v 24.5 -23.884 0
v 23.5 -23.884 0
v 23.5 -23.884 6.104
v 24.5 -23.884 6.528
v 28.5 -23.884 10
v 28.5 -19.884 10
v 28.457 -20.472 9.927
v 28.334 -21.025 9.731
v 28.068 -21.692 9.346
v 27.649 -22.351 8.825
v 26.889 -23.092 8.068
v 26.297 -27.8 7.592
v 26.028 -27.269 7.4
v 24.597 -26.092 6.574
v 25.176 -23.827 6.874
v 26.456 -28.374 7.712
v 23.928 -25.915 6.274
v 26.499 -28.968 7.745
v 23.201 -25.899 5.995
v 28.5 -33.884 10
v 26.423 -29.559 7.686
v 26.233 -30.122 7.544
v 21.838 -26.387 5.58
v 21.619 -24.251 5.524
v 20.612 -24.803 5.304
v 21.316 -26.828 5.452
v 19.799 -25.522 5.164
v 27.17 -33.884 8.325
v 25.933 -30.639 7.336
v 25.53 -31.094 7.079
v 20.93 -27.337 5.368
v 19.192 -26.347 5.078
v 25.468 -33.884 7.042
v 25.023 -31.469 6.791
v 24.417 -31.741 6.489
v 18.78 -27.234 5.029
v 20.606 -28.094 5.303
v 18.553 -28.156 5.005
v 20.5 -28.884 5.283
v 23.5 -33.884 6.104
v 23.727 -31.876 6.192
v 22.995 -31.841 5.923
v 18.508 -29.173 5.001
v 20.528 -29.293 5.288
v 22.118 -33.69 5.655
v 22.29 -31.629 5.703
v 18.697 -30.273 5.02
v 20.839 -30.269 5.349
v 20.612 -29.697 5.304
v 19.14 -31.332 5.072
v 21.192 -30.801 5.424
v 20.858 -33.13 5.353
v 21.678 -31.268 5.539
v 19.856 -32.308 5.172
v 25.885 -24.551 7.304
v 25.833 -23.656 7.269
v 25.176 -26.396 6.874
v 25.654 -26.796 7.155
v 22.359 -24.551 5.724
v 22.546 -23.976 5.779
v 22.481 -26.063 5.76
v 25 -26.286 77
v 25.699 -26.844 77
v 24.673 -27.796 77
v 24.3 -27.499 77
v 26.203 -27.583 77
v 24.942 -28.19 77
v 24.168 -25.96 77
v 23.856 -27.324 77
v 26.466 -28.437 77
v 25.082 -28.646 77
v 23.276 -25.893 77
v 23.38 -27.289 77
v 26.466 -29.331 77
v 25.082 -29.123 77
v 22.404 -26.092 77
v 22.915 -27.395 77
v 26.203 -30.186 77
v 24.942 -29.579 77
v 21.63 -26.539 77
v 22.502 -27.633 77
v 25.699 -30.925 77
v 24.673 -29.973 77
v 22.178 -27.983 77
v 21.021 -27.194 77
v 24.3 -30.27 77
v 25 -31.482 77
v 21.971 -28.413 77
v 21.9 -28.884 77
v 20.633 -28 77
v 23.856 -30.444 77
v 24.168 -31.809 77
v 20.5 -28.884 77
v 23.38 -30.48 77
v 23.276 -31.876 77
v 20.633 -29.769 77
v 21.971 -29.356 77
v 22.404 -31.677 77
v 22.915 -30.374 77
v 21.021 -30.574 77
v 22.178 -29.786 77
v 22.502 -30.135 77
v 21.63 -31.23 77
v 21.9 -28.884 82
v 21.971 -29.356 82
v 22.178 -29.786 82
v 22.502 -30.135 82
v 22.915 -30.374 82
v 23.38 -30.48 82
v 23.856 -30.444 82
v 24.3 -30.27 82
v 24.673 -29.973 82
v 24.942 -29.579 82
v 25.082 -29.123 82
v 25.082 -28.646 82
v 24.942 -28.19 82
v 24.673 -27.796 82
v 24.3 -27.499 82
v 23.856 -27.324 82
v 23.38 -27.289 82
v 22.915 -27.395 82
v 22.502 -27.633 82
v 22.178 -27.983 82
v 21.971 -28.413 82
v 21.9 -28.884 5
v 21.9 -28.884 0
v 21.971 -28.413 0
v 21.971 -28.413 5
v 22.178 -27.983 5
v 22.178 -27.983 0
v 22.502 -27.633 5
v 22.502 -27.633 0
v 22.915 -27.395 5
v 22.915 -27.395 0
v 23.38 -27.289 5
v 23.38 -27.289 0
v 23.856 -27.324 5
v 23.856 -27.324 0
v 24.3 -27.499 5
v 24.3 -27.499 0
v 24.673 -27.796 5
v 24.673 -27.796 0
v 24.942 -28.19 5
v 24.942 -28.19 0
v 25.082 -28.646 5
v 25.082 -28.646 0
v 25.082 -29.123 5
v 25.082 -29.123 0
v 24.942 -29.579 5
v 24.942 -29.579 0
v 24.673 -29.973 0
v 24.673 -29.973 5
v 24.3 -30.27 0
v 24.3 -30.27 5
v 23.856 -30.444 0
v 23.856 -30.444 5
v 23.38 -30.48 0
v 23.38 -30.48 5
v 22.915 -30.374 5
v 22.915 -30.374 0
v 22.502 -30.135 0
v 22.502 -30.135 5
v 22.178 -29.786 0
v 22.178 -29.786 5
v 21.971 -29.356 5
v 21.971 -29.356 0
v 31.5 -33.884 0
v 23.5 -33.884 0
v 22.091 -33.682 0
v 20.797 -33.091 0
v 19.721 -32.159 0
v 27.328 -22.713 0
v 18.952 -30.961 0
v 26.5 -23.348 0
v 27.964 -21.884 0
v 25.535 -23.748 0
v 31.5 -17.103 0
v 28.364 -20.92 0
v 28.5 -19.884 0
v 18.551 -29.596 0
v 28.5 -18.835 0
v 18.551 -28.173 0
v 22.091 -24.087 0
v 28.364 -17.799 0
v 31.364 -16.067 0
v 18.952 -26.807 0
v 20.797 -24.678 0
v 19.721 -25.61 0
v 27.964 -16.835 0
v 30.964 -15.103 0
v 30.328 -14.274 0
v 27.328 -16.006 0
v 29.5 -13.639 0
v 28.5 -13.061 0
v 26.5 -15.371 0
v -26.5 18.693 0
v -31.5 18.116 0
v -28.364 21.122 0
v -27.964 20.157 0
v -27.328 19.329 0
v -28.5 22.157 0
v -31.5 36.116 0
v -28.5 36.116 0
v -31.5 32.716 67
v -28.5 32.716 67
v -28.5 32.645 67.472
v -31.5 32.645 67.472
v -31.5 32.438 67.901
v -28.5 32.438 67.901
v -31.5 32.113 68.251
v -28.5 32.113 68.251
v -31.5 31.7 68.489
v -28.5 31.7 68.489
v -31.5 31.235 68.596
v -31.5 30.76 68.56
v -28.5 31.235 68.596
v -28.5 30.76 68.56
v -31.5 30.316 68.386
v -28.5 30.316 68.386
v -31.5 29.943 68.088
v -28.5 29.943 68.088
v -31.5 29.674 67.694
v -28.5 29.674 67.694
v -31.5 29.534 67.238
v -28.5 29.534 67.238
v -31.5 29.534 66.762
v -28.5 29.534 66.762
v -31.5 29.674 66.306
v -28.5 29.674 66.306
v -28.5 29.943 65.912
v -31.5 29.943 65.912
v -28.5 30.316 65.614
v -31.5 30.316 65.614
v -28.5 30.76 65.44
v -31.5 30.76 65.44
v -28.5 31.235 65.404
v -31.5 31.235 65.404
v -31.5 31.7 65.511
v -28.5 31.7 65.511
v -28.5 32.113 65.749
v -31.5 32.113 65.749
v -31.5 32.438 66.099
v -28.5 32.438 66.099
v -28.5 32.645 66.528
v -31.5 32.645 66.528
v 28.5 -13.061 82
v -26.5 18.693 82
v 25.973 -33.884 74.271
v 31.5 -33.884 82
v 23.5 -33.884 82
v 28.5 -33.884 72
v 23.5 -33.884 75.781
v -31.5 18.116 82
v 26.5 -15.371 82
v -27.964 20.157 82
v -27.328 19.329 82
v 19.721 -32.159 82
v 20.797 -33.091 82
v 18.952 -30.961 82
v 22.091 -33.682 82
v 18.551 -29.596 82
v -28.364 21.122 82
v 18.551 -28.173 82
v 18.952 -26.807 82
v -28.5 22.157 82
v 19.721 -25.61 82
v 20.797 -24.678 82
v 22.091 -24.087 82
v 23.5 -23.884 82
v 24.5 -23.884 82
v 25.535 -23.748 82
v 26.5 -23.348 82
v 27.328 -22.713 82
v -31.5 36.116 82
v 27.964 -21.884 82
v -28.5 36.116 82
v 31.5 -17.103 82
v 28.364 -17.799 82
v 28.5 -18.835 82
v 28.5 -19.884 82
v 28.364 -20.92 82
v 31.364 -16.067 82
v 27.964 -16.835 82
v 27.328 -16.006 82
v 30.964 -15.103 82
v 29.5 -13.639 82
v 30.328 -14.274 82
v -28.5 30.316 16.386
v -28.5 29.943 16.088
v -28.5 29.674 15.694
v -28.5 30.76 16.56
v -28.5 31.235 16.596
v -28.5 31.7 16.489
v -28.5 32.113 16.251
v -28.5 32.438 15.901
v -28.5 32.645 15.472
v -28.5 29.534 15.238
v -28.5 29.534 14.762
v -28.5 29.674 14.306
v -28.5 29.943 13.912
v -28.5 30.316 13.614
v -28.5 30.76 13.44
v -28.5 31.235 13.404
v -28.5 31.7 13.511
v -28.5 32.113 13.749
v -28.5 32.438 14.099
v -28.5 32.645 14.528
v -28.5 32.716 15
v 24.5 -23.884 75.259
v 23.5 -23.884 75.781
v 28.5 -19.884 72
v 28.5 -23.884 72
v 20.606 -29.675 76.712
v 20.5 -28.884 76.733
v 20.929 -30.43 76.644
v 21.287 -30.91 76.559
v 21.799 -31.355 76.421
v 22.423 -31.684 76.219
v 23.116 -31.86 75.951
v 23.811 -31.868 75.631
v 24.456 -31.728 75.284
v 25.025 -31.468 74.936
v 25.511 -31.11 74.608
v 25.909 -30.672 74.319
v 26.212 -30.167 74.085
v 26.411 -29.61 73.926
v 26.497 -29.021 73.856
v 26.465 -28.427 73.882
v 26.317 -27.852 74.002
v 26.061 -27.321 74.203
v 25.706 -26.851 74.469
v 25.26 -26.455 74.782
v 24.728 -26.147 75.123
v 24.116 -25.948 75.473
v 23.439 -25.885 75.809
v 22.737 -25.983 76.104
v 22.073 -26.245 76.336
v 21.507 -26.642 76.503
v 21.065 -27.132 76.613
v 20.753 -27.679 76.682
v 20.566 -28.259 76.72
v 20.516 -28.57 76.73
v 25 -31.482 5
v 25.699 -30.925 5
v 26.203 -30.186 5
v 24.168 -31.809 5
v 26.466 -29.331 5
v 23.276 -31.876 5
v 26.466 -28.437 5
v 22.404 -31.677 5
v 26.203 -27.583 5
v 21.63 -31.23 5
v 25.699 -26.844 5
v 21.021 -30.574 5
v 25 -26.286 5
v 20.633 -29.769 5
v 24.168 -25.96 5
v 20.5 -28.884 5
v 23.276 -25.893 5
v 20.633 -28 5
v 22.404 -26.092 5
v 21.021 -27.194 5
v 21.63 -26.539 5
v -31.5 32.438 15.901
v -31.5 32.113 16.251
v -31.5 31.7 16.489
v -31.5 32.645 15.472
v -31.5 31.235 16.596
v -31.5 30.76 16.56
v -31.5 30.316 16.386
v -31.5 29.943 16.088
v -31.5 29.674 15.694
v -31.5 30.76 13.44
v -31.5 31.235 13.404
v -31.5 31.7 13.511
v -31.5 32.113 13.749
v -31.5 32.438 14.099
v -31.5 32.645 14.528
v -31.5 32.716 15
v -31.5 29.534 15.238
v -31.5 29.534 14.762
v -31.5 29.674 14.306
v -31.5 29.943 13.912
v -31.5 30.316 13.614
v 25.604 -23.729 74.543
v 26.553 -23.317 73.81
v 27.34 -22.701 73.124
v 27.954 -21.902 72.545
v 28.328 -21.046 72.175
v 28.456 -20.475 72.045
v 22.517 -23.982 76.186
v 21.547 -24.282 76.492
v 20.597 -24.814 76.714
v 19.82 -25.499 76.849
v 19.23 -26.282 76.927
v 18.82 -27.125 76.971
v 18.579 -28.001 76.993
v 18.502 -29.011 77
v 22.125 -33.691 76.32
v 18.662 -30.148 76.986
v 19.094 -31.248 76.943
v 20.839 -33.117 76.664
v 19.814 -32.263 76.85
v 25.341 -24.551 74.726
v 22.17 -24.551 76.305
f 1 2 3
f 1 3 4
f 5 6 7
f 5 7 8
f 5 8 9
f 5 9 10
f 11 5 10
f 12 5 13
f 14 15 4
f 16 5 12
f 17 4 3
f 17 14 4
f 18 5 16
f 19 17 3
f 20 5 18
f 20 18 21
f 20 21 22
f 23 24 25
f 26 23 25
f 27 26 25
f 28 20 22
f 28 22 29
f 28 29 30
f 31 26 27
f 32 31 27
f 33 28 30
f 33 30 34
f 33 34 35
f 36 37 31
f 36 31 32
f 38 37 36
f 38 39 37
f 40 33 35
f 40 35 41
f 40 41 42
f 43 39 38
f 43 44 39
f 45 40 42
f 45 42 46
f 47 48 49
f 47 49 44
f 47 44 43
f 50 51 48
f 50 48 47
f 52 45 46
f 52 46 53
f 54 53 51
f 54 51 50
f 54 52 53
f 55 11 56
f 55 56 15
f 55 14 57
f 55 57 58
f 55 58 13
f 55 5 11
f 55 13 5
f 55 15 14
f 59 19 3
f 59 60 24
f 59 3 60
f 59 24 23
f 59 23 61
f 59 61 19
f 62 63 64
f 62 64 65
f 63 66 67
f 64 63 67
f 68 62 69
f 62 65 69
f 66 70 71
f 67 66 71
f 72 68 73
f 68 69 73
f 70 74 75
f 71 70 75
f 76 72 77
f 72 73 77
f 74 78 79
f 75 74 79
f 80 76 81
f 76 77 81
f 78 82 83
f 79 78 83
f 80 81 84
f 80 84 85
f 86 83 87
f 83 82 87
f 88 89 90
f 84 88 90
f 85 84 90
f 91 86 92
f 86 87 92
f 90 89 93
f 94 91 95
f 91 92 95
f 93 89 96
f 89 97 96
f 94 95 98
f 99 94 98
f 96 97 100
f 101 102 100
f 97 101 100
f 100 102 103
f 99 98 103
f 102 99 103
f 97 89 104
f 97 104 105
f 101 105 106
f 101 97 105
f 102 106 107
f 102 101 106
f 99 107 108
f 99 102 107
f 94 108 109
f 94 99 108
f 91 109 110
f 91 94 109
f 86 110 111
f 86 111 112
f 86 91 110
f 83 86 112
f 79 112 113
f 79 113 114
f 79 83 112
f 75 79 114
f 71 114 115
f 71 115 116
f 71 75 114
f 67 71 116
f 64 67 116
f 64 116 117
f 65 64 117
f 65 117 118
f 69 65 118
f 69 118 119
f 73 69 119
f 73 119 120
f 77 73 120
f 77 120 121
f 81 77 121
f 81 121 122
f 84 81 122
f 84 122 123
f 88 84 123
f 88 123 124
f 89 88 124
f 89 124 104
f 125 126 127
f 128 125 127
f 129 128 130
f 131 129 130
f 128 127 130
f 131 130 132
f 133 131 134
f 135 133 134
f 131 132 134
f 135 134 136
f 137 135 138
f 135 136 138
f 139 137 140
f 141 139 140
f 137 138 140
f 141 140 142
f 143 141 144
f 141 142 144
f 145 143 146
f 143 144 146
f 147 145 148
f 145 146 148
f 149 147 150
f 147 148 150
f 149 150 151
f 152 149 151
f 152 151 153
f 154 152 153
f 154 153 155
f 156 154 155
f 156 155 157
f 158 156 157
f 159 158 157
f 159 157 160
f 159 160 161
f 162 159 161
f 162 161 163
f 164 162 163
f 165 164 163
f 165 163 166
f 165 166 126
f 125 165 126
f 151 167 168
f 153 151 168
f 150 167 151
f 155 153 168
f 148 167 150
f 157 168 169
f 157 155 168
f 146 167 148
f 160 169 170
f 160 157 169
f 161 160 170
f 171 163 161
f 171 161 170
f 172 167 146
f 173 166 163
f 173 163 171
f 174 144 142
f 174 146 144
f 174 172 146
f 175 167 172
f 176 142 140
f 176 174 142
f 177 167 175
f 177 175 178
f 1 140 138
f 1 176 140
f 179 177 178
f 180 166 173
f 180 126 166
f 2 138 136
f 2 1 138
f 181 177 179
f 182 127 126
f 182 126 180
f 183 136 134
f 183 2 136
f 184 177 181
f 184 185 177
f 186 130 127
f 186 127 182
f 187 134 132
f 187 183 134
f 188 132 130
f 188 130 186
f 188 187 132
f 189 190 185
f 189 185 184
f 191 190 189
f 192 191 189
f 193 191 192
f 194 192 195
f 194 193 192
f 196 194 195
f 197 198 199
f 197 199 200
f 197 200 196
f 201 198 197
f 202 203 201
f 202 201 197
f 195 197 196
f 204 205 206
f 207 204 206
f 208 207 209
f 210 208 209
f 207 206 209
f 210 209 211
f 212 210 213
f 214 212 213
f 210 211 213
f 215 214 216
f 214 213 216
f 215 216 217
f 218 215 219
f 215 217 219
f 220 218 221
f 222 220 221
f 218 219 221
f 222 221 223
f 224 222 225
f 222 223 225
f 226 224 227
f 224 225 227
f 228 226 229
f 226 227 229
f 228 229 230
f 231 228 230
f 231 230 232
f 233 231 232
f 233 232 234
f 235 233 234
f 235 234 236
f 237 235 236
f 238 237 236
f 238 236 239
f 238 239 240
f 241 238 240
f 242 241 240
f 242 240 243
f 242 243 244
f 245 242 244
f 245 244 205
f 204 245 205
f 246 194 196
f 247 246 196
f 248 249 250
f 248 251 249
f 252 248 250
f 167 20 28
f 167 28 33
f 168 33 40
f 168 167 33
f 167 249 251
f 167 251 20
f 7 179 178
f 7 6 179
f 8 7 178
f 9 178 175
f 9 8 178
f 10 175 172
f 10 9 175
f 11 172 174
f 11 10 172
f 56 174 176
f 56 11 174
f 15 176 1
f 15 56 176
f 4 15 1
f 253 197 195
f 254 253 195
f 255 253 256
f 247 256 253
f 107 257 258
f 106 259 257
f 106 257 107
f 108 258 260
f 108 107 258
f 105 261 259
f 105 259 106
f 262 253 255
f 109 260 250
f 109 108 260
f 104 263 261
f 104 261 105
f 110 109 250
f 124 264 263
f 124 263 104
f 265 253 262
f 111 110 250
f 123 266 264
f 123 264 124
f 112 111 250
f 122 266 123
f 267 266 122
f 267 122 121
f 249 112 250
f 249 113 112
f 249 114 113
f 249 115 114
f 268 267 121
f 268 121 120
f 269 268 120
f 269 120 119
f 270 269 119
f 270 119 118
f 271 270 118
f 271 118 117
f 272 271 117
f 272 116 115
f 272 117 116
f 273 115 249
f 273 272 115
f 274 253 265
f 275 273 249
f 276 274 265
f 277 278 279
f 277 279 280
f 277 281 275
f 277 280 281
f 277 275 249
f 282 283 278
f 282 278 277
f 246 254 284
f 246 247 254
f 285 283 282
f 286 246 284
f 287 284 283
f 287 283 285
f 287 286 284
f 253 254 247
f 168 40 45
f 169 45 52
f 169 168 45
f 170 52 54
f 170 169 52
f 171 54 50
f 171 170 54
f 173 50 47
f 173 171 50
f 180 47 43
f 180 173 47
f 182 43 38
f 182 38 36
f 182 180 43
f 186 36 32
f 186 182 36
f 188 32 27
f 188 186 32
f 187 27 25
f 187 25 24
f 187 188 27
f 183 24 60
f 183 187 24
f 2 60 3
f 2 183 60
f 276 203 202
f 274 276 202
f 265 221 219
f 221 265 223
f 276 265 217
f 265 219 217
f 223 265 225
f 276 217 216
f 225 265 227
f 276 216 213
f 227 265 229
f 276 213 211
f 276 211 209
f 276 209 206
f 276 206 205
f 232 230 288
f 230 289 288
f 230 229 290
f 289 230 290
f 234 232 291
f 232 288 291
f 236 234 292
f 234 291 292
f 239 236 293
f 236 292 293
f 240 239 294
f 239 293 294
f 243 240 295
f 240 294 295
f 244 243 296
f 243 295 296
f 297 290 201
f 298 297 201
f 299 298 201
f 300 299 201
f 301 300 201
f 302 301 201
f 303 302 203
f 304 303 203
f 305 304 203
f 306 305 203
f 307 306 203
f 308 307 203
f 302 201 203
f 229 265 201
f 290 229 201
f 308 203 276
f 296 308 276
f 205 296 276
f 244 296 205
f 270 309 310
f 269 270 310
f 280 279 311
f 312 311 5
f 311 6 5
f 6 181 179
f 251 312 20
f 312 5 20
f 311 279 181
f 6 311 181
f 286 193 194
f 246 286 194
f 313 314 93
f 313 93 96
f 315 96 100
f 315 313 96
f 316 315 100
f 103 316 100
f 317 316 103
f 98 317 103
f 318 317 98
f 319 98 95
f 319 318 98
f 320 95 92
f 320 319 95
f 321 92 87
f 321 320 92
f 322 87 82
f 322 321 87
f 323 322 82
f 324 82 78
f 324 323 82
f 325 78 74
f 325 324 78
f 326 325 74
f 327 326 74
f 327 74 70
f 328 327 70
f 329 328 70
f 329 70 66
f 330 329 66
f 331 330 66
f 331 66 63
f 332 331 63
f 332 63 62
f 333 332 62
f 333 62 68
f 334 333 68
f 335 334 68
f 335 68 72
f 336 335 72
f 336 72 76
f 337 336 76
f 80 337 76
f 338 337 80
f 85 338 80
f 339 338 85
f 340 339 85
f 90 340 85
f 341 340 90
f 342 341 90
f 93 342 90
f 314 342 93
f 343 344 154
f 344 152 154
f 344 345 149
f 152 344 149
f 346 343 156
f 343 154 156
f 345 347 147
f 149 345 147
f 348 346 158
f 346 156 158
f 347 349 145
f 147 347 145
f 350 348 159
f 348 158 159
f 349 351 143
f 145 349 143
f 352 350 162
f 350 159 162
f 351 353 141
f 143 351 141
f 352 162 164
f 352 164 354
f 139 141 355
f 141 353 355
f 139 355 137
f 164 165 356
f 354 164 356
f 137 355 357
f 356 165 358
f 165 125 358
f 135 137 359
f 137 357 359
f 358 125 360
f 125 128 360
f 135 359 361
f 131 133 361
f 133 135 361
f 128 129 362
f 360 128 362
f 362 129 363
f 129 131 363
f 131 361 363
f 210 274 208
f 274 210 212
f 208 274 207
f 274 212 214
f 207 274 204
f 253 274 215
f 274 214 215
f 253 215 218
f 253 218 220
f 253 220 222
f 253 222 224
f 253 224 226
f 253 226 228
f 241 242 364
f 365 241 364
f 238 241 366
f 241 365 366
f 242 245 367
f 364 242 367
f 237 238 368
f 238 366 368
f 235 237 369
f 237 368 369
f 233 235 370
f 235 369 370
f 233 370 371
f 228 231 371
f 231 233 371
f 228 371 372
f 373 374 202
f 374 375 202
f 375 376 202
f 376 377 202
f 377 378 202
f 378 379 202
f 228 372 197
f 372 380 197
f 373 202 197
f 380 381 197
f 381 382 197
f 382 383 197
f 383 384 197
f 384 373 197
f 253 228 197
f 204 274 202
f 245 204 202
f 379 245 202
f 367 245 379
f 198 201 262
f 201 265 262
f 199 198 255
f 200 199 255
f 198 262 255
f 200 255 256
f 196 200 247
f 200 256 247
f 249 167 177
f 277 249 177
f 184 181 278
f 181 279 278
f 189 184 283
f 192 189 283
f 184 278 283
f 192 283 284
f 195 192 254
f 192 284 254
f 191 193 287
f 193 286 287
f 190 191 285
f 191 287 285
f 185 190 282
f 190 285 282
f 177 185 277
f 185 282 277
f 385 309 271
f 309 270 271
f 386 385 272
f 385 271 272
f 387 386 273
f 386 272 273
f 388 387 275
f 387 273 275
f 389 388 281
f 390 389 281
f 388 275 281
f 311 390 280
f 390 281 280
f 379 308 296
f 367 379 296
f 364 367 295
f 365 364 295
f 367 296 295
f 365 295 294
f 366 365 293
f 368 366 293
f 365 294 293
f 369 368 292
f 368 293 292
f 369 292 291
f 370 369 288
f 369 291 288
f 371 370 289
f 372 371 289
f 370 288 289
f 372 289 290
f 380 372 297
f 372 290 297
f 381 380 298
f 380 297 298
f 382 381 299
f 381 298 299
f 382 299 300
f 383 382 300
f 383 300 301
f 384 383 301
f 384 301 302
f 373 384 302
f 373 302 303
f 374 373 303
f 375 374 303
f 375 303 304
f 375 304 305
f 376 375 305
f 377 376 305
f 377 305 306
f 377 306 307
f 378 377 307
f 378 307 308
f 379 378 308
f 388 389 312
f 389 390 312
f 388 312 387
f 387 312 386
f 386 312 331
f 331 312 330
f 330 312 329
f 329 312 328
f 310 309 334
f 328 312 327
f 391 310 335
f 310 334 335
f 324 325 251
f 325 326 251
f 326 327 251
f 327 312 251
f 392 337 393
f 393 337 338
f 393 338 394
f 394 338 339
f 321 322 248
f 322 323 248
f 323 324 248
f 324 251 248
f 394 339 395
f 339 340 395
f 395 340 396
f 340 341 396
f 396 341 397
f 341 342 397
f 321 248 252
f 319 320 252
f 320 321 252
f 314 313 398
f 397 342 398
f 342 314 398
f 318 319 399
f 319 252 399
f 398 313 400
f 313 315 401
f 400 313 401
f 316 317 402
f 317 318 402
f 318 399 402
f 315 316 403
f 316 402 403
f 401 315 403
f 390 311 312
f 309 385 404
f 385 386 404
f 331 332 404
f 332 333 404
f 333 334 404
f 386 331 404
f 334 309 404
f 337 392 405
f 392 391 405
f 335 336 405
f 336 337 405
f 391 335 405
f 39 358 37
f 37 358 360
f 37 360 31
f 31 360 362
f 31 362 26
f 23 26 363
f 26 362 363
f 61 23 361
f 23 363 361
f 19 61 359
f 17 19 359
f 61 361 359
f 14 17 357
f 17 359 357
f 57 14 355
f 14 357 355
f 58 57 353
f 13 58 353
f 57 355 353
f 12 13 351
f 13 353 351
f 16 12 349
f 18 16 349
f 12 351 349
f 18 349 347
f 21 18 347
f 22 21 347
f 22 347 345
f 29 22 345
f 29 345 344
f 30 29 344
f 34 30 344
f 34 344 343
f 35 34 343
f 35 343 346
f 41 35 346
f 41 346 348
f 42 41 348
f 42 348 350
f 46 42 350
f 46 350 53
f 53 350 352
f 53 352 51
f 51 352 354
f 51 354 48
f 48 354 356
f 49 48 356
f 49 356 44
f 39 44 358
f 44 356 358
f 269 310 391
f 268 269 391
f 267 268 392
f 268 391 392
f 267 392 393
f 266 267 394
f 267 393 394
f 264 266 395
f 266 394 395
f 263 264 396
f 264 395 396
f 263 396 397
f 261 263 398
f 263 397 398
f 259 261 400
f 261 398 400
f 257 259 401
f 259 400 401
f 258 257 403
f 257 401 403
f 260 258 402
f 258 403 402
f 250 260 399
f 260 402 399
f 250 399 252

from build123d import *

# Parameters (mm, degrees)
EXTRUDE_1_DEPTH     = 82
CUT_EXTRUDE_1_REACH = 109.835
SKETCH_2_R          = 1.6
SKETCH_3_R          = 1.6
EXTRUDE_2_DEPTH     = 10
CUT_EXTRUDE_2_DEPTH = 10
SKETCH_5_R          = 3
CUT_EXTRUDE_3_DEPTH = 10
EXTRUDE_START       = -10
SKETCH_6_R          = 1.6
EXTRUDE_3_DEPTH     = 10
CUT_EXTRUDE_4_REACH = 114.322
CUT_EXTRUDE_START   = -10
SKETCH_8_R          = 3
CUT_EXTRUDE_5_DEPTH = 10
FILLET_1_R          = 4


with BuildPart() as part:
    # 草图1 → 凸台-拉伸1 (new body)
    with BuildSketch(Plane.XY):
        Polygon((-31.5, 18.115697408), (28.5, -16.525318744), (28.5, -33.884302592), (31.5, -33.884302592), (31.5, -14.793267936), (28.5, -13.061217128), (-28.5, 19.847748215), (-28.5, 36.115697408), (-31.5, 36.115697408), align=None)
    extrude(amount=EXTRUDE_1_DEPTH)

    # 草图2 → 切除-拉伸1 (cut, up to next)
    with BuildSketch(Plane(origin=(-28.5, 0, 0), x_dir=(0, 0, -1), z_dir=(1, 0, 0)), mode=Mode.PRIVATE) as cut_extrude_1_sk1:
        with Locations(Location((-67, 31.115697408, 0), (0, 0, 90))):
            Circle(SKETCH_2_R)
    cut_extrude_1_tool1 = extrude(cut_extrude_1_sk1.sketch, amount=-CUT_EXTRUDE_1_REACH, mode=Mode.PRIVATE) & part.part
    # 草图2 → 切除-拉伸1 (cut, up to next)
    with BuildSketch(Plane(origin=(-28.5, 0, 0), x_dir=(0, 0, -1), z_dir=(1, 0, 0)), mode=Mode.PRIVATE) as cut_extrude_1_sk2:
        with Locations(Location((-15, 31.115697408, 0), (0, 0, 90))):
            Circle(SKETCH_2_R)
    cut_extrude_1_tool2 = extrude(cut_extrude_1_sk2.sketch, amount=-CUT_EXTRUDE_1_REACH, mode=Mode.PRIVATE) & part.part
    add(cut_extrude_1_tool1.solids().sort_by_distance((-28.5, 31.115697, 67))[0], mode=Mode.SUBTRACT)
    add(cut_extrude_1_tool2.solids().sort_by_distance((-28.5, 31.115697, 15))[0], mode=Mode.SUBTRACT)

    # 草图3 → 凸台-拉伸2 (add)
    with BuildSketch(Plane(origin=(0, 0, 0), x_dir=(-1, 0, 0), z_dir=(0, 0, -1))):
        with BuildLine():
            Line((-28.5, -33.884302592), (-23.5, -33.884302592))
            ThreePointArc((-23.5, -33.884302592), (-18.5, -28.884302592), (-23.5, -23.884302592))
            Line((-23.5, -23.884302592), (-28.5, -23.884302592))
            Line((-28.5, -23.884302592), (-28.5, -33.884302592))
        make_face()
        with Locations((-23.5, -28.884302592)):
            Circle(SKETCH_3_R, mode=Mode.SUBTRACT)
    extrude(amount=-EXTRUDE_2_DEPTH)

    # 草图4 → 切除-拉伸2 (cut)
    with BuildSketch(Plane.XZ.offset(33.884302592)):
        with BuildLine():
            Line((15.48929146, 10), (15.48929146, 5))
            Line((15.48929146, 5), (18.5, 5))
            add(Edge.make_bspline(
                [(28.5, 10), (26.534032888, 6.656358998), (22.320432112, 5.379510278), (18.5, 5)],
                knots=[0, 0, 0, 0, 1, 1, 1, 1], degree=3))
            Line((28.5, 10), (15.48929146, 10))
        make_face()
    extrude(amount=-CUT_EXTRUDE_2_DEPTH, mode=Mode.SUBTRACT)

    # 草图5 → 切除-拉伸3 (cut)
    with BuildSketch(Plane(origin=(0, 0, 5), x_dir=(-1, 0, 0), z_dir=(0, 0, -1))):
        with Locations((-23.5, -28.884302592)):
            Circle(SKETCH_5_R)
    extrude(amount=-CUT_EXTRUDE_3_DEPTH, mode=Mode.SUBTRACT)

    # 草图6 → 凸台-拉伸3 (add)
    with BuildSketch(Plane.XY.offset(82).offset(EXTRUDE_START)):
        with BuildLine():
            Line((28.5, -23.884302592), (23.5, -23.884302592))
            ThreePointArc((23.5, -23.884302592), (18.5, -28.884302592), (23.5, -33.884302592))
            Line((23.5, -33.884302592), (28.5, -33.884302592))
            Line((28.5, -33.884302592), (28.5, -23.884302592))
        make_face()
        with Locations(Location((23.5, -28.884302592, 0), (0, 0, 180))):
            Circle(SKETCH_6_R, mode=Mode.SUBTRACT)
    extrude(amount=EXTRUDE_3_DEPTH)

    # 草图7 → 切除-拉伸4 (cut, up to next)
    with BuildSketch(Plane.XZ.offset(33.884302592), mode=Mode.PRIVATE) as cut_extrude_4_sk1:
        with BuildLine():
            Line((28.5, 72), (15.711275948, 72))
            Line((15.711275948, 72), (15.711275948, 77))
            Line((15.711275948, 77), (18.5, 77))
            add(Edge.make_bspline(
                [(28.5, 72), (25.18574882, 75.388408821), (22.578679104, 76.660150146), (18.5, 77)],
                knots=[0, 0, 0, 0, 1, 1, 1, 1], degree=3))
        make_face()
    cut_extrude_4_tool1 = extrude(cut_extrude_4_sk1.sketch, amount=-CUT_EXTRUDE_4_REACH, mode=Mode.PRIVATE) & part.part
    add(cut_extrude_4_tool1.solids().sort_by_distance((20.757737, -33.884303, 74.139279))[0], mode=Mode.SUBTRACT)

    # 草图8 → 切除-拉伸5 (cut)
    with BuildSketch(Plane.XY.offset(77).offset(CUT_EXTRUDE_START)):
        with Locations(Location((23.5, -28.884302592, 0), (0, 0, 180))):
            Circle(SKETCH_8_R)
    extrude(amount=CUT_EXTRUDE_5_DEPTH, mode=Mode.SUBTRACT)

    # 圆角1
    fillet_1_edges = [part.edges().sort_by_distance(p)[0] for p in [
        (28.5, -16.525318744, 41),
        (31.5, -14.793267936, 41),
        (-28.5, 19.847748215, 41),
        (28.5, -23.884302592, 77),
        (28.5, -23.884302592, 5),
    ]]
    fillet(fillet_1_edges, radius=FILLET_1_R)


solid = part.part
